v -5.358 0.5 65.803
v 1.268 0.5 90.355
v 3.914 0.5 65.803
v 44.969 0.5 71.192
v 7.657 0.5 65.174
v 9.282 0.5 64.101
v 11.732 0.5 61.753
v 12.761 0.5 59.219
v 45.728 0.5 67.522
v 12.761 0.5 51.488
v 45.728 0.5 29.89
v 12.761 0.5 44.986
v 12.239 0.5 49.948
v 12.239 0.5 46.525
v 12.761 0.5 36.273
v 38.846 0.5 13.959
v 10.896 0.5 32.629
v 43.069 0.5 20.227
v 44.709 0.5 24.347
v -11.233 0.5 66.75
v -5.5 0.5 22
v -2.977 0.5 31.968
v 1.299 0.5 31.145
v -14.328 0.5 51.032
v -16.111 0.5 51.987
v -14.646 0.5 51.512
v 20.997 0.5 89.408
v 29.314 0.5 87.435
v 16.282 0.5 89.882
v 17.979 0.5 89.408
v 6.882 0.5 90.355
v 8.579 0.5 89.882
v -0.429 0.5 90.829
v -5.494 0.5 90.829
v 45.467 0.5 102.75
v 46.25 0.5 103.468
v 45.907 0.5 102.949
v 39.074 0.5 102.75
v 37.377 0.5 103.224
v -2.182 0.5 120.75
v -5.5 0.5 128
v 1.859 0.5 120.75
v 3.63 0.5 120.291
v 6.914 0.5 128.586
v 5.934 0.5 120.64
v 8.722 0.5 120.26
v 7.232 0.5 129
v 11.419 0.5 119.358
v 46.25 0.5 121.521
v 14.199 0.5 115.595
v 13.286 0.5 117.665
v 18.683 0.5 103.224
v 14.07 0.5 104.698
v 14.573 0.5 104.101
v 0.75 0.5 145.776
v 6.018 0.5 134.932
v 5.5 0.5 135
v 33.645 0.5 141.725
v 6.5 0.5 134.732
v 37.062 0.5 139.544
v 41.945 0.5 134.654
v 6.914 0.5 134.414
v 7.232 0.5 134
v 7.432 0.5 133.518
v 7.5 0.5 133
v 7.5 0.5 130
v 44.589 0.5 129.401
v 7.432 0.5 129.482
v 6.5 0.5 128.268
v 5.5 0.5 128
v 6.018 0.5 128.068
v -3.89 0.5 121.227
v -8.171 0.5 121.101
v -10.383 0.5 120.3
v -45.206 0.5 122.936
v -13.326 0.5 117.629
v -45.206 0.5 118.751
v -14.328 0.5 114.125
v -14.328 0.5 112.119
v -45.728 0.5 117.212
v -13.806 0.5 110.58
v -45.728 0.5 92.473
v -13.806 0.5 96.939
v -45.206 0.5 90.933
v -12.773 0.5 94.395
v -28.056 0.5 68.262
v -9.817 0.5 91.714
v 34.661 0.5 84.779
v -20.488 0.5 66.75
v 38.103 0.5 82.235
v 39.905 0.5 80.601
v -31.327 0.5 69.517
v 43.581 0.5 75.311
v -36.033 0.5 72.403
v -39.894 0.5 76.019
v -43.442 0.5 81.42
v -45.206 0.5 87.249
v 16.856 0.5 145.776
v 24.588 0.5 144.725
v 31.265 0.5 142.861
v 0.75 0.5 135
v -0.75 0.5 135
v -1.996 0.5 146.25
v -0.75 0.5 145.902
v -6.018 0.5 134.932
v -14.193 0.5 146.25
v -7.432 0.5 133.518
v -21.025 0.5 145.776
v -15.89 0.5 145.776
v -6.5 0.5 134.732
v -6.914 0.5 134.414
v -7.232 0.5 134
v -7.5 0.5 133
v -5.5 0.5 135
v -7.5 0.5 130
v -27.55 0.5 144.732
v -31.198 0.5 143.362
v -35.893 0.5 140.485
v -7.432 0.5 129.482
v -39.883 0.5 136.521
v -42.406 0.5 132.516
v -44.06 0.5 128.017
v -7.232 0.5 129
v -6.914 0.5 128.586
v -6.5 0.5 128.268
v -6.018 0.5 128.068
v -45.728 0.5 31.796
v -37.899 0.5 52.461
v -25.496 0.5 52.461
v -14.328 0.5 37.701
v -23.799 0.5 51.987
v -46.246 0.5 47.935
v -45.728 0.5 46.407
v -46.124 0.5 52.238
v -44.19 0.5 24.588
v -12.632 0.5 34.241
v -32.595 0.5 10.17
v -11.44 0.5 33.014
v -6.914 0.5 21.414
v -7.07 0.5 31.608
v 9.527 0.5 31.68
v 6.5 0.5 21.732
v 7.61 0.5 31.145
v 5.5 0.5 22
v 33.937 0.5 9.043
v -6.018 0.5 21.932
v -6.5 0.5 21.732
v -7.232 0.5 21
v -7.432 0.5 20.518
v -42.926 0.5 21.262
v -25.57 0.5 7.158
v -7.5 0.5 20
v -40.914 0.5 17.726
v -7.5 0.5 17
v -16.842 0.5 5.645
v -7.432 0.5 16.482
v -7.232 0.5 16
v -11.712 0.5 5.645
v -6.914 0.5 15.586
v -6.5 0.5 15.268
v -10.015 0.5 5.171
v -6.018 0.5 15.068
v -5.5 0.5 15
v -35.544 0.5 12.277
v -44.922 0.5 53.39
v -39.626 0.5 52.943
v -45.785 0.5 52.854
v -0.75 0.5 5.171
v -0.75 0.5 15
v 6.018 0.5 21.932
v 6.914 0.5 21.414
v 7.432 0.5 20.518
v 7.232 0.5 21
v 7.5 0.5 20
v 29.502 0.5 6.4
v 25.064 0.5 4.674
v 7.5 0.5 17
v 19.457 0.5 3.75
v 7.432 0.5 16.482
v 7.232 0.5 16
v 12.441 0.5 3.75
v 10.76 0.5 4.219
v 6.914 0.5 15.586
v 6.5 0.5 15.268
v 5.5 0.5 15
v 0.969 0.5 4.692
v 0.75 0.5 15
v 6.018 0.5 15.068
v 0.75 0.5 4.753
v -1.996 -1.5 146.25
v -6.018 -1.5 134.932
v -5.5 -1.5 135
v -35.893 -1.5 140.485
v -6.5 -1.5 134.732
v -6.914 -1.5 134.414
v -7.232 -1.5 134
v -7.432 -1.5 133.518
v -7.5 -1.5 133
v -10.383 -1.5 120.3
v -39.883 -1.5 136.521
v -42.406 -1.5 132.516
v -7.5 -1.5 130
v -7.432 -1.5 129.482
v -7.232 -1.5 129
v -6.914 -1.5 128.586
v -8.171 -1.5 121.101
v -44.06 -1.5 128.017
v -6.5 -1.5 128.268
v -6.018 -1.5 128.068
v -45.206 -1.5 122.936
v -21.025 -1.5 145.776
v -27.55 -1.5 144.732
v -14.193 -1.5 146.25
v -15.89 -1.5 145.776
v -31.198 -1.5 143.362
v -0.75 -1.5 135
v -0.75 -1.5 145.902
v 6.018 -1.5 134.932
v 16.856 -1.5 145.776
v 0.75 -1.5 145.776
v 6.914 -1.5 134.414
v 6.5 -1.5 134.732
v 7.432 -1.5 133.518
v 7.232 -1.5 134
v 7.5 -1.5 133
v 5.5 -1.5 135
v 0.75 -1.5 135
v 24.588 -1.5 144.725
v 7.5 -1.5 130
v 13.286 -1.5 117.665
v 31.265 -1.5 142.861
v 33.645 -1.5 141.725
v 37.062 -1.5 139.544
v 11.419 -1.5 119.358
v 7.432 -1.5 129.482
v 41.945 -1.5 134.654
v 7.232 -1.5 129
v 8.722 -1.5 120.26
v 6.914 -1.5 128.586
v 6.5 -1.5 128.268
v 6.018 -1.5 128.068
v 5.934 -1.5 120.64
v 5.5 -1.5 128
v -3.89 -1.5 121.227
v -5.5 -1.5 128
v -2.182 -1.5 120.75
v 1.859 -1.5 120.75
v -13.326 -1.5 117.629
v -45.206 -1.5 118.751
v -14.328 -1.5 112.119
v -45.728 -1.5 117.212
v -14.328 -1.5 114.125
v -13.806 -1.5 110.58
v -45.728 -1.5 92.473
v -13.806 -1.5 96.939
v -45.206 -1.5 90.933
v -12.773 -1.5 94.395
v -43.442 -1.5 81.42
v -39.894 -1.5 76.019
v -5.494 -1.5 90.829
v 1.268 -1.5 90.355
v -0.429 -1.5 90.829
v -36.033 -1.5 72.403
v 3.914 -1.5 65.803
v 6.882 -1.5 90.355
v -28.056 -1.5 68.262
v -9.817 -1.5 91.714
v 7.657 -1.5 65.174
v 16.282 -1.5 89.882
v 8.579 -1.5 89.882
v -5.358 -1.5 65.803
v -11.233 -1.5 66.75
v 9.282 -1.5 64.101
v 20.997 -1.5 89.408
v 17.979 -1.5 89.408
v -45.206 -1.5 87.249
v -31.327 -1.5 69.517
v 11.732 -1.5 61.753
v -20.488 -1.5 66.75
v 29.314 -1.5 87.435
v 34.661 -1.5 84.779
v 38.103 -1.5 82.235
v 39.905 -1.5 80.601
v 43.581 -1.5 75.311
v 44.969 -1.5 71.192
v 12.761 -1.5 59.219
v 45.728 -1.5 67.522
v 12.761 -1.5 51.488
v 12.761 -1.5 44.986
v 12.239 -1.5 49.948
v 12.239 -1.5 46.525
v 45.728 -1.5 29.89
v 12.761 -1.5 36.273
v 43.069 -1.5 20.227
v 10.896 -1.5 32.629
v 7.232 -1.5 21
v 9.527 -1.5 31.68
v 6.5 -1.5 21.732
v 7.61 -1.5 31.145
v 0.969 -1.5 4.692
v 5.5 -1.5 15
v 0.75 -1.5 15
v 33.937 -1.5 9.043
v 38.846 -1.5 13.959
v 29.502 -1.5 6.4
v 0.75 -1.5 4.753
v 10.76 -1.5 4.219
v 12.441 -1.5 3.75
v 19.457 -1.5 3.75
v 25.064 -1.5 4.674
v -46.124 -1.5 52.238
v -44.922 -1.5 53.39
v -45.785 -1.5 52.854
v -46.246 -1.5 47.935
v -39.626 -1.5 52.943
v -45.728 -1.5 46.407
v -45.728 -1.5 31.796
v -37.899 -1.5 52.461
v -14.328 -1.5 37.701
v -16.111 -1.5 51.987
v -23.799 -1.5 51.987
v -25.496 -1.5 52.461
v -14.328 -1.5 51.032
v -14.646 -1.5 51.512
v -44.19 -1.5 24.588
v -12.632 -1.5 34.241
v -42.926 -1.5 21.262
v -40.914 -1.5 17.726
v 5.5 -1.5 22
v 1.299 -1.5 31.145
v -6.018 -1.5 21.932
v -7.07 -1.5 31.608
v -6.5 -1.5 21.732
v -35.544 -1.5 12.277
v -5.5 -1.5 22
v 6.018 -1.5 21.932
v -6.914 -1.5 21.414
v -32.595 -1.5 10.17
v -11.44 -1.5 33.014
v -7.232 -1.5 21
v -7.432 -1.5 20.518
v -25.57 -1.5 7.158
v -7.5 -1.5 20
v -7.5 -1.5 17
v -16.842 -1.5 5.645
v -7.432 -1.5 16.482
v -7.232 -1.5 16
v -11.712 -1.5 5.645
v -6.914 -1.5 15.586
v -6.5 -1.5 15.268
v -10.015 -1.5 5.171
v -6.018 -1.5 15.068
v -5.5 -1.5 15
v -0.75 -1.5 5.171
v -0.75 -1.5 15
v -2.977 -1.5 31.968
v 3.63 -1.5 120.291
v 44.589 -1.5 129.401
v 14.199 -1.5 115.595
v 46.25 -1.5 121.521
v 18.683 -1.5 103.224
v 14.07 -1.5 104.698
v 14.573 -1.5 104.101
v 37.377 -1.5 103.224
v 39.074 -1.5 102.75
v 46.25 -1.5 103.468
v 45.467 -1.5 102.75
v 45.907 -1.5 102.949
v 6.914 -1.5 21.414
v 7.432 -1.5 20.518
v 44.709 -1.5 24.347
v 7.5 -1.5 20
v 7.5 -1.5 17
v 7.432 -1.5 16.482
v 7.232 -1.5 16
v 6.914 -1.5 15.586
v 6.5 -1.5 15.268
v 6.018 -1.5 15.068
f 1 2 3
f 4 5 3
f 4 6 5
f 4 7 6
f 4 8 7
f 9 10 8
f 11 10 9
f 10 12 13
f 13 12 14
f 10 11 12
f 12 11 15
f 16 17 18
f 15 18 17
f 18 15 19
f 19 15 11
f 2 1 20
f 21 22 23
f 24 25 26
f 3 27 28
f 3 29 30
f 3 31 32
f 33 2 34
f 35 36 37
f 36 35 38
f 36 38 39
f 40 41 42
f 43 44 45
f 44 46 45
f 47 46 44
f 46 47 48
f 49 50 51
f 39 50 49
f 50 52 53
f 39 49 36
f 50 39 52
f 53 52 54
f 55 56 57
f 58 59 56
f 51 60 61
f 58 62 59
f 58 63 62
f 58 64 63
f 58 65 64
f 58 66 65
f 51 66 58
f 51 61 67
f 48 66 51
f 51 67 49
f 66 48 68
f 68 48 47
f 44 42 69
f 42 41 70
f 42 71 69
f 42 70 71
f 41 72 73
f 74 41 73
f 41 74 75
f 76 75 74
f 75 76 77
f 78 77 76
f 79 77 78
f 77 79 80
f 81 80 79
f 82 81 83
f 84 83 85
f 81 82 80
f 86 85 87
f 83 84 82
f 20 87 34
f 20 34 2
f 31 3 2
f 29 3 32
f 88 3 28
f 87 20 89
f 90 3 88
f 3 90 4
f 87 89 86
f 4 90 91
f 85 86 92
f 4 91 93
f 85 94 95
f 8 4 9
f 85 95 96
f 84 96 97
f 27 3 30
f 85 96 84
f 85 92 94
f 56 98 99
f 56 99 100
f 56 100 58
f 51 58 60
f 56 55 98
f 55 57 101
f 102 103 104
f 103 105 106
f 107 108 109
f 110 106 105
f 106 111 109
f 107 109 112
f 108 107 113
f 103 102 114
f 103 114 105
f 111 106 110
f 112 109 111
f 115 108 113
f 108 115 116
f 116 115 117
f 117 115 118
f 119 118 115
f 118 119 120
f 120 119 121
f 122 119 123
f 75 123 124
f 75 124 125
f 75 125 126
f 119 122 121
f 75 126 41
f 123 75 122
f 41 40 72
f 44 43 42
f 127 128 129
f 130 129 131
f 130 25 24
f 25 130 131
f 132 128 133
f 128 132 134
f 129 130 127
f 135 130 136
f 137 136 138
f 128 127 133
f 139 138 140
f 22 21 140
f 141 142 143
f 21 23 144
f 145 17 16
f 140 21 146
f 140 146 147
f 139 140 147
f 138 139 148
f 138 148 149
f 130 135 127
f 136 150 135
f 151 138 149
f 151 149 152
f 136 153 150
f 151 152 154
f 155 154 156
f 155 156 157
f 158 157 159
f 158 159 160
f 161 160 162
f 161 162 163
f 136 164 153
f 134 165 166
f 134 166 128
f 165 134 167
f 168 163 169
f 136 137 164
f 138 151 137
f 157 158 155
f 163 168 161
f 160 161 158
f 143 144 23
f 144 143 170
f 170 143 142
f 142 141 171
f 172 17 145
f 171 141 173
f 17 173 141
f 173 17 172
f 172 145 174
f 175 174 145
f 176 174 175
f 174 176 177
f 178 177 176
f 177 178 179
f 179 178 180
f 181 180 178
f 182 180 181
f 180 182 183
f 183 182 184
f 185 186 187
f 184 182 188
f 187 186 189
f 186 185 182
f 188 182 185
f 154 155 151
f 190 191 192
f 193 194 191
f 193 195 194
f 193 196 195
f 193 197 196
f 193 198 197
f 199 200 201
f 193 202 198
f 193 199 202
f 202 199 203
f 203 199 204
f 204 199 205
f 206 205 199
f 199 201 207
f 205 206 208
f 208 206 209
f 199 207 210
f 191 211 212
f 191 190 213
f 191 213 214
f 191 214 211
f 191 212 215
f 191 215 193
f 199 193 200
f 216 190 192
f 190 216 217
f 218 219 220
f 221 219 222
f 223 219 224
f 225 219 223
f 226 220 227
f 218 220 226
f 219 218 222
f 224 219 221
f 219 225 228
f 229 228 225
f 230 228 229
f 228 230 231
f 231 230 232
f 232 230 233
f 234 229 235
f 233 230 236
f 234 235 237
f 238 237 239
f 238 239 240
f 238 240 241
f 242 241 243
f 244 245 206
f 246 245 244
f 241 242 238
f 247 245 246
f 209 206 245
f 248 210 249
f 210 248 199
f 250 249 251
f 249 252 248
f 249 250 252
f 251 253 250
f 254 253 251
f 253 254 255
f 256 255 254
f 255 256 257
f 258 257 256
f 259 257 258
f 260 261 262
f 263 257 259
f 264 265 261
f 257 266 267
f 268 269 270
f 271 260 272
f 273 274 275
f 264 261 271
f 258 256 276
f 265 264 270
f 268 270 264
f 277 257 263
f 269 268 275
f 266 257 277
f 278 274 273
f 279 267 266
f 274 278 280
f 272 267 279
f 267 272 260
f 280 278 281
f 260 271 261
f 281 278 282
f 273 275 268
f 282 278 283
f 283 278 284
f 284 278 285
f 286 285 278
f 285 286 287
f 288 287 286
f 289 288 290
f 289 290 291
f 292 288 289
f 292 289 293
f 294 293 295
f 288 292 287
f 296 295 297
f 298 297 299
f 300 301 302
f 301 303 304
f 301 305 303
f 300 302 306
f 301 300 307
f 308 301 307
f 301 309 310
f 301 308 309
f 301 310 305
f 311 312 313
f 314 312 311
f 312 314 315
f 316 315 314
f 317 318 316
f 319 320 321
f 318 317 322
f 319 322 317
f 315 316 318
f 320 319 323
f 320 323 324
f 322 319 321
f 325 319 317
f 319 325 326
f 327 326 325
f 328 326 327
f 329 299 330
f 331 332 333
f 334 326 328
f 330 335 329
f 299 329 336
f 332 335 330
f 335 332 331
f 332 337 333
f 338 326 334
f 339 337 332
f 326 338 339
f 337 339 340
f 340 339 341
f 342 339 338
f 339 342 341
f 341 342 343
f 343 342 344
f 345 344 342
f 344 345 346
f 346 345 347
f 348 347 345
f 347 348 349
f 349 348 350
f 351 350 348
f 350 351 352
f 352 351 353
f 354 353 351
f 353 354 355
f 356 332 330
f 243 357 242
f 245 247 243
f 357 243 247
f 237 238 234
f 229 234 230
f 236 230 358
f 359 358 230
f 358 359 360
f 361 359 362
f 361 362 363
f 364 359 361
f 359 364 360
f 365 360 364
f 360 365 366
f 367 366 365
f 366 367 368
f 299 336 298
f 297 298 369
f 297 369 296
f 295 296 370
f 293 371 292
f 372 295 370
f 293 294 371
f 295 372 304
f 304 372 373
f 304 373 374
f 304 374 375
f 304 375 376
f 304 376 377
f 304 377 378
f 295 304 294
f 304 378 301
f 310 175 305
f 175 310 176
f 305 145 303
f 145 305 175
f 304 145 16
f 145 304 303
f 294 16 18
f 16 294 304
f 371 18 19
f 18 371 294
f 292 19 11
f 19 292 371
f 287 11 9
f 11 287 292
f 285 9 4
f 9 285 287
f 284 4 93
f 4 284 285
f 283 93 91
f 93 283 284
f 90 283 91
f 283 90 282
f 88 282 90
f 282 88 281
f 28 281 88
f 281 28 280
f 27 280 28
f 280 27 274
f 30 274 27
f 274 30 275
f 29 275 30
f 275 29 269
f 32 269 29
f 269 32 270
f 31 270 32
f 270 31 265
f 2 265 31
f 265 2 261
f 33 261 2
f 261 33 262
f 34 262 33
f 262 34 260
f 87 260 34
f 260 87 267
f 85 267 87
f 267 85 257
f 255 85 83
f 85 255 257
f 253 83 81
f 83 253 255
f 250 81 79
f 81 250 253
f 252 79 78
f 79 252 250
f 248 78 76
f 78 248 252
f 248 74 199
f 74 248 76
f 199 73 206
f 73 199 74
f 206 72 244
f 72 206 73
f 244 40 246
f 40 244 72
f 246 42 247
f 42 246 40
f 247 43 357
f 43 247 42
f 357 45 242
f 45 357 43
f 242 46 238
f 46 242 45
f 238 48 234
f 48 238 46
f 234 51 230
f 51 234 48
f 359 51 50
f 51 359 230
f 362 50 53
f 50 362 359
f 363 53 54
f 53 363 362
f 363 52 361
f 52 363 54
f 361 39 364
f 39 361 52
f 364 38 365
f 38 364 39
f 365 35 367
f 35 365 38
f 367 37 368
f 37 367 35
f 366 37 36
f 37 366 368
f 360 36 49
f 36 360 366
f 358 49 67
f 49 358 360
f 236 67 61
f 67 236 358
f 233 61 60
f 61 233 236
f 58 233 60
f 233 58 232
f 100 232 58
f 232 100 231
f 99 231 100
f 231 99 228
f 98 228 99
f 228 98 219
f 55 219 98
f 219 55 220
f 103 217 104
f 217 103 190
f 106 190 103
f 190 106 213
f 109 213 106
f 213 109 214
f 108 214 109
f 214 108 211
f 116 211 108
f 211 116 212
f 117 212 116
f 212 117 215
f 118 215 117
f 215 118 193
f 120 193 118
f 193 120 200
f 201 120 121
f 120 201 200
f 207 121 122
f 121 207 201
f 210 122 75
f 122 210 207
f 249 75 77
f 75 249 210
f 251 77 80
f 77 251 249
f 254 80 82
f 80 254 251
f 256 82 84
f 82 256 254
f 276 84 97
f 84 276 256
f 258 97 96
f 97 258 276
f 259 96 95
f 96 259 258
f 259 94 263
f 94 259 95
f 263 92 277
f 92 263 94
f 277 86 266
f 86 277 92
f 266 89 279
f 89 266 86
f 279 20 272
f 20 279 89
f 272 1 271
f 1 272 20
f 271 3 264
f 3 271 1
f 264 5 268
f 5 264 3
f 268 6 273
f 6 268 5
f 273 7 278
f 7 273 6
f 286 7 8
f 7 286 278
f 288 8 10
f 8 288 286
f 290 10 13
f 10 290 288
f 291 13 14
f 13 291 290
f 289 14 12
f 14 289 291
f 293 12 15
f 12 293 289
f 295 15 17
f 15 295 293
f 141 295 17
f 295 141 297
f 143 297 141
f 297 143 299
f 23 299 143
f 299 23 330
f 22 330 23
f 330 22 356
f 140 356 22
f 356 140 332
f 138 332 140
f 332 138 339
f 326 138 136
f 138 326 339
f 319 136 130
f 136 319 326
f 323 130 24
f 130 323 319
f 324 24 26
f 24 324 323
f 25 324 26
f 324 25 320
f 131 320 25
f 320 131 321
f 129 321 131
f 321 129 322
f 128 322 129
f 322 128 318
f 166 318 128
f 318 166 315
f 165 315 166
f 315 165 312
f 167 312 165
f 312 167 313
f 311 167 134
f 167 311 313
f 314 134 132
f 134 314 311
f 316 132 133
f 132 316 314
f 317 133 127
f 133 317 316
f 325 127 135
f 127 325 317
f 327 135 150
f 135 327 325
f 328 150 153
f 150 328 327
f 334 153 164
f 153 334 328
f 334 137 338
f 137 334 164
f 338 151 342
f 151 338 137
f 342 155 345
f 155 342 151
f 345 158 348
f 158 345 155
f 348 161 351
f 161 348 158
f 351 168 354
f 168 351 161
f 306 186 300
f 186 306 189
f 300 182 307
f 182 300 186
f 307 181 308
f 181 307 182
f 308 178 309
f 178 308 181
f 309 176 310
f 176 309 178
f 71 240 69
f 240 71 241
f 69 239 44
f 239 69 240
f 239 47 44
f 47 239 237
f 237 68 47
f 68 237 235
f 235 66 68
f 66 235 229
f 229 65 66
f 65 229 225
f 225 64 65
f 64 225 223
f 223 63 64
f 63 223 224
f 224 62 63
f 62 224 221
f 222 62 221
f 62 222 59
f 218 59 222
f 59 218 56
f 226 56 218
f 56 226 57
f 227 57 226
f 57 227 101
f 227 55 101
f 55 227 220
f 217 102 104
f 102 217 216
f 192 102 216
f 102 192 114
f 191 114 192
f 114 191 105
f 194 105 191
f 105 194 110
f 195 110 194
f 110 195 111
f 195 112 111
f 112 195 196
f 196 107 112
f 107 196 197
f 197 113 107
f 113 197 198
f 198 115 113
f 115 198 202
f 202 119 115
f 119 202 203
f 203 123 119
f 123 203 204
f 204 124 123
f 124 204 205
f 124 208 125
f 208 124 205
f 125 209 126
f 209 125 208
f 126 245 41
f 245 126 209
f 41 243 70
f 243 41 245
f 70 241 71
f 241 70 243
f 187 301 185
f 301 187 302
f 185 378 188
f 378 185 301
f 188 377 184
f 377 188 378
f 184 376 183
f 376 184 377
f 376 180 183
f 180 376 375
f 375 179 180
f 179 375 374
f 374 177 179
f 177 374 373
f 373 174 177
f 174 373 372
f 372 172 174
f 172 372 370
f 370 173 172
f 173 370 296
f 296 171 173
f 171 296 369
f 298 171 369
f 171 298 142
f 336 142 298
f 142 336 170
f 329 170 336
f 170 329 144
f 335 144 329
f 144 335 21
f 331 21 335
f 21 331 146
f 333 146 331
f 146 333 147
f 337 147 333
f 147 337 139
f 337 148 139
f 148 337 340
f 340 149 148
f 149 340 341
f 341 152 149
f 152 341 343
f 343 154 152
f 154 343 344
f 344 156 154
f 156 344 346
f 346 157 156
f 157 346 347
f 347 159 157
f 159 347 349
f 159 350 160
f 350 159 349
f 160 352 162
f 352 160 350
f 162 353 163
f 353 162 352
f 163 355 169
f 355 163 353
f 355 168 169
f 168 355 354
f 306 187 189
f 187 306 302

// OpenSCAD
// file: shape_pts.scad
// Letter "S" (#7 Upper) ? Top X=0 Conduit + Bottom X=0 Conduit to Snake I
// Vertical-display edition: bottom divider clip removed, interlocking hollow double-dovetail channels added.

shape_w = 94.00;
shape_h = 144.00;

rec_snap_top_x = -0.81;
rec_snap_top_z = 144.00;
rec_snap_bot_x = 3.51;

rec_top_conn_enable   = true;
rec_top_conn_x        = 0.00;
rec_bot_conn_enable   = true;
rec_bot_conn_x        = 0.00;
rec_left_conn_enable  = false;
rec_left_conn_z       = 0.00;
rec_left_conn_face_x  = 0.00;
rec_left_conn_pocket_x = 0.00;
rec_right_conn_enable = false;
rec_right_conn_z      = 0.00;
rec_right_conn_face_x = 0.00;
rec_right_conn_pocket_x = 0.00;

rec_magnet_enable = true;
rec_magnet_x      = 28.80;
rec_magnet_z      = 120.20;

rec_wall_mount_enable = false;
rec_wall_mount_x      = 0.00;
rec_wall_mount_z      = 75.00;

rec_include_controller = false;
rec_chip_x     = 28.50;
rec_chip_z     = 55.00;
rec_cable_x    = 28.50;
rec_ziptie_z   = 30.50;
rec_keyhole_z  = 18.00;
rec_slit_dir   = 1;

rec_pillars = [[-28.0, 118.0], [-28.0, 86.0], [28.5, 48.0]];
rec_has_face_grooves = false;

shape_pts = [[47.000,118.599],[47.000,100.243],[46.413,99.355],[45.629,99.000],[38.971,99.000],[37.274,99.474],[18.604,99.474],[14.165,100.421],[13.317,101.428],[13.447,112.441],[12.664,114.217],[11.032,115.697],[8.551,116.526],[5.940,116.882],[3.590,116.526],[1.763,117.000],[-2.285,117.000],[-3.982,117.474],[-8.029,117.355],[-9.988,116.645],[-12.664,114.217],[-13.578,111.020],[-13.578,109.243],[-13.056,107.704],[-13.056,94.086],[-12.142,91.836],[-9.465,89.408],[-5.418,88.579],[-0.326,88.579],[1.371,88.105],[6.985,88.105],[8.682,87.632],[16.385,87.632],[18.082,87.158],[21.085,87.158],[29.571,85.145],[35.054,82.421],[38.579,79.816],[40.472,78.099],[44.258,72.651],[45.694,68.388],[46.478,64.599],[46.478,26.822],[45.433,21.138],[43.736,16.875],[39.428,10.480],[34.401,5.447],[29.832,2.724],[25.263,0.947],[19.518,0.000],[12.338,0.000],[10.640,0.474],[0.849,0.947],[-0.849,1.421],[-10.118,1.421],[-11.815,1.895],[-16.907,1.895],[-25.785,3.434],[-32.965,6.513],[-36.033,8.704],[-41.517,14.270],[-43.606,17.941],[-44.911,21.375],[-46.478,28.717],[-46.478,43.283],[-47.000,44.822],[-46.869,49.441],[-46.347,50.388],[-45.107,51.158],[-39.493,50.684],[-37.796,50.211],[-25.393,50.211],[-23.696,49.737],[-15.993,49.737],[-14.165,49.145],[-13.578,48.257],[-13.578,34.875],[-12.011,31.678],[-11.032,30.671],[-6.985,29.368],[-2.938,29.724],[1.371,28.895],[7.507,28.895],[9.204,29.368],[10.314,30.138],[12.011,33.454],[12.011,41.862],[11.489,43.401],[11.489,47.072],[12.011,48.612],[12.011,56.072],[11.097,58.322],[8.812,60.513],[7.376,61.461],[3.851,62.053],[-5.418,62.053],[-11.293,63.000],[-20.562,63.000],[-28.265,64.539],[-31.660,65.842],[-36.490,68.803],[-40.472,72.533],[-44.128,78.099],[-45.956,84.138],[-45.956,87.809],[-46.478,89.349],[-46.478,114.336],[-45.956,115.875],[-45.956,120.020],[-44.781,125.230],[-43.083,129.849],[-40.472,133.993],[-36.360,138.079],[-31.529,141.039],[-27.743,142.461],[-21.085,143.526],[-15.993,143.526],[-14.296,144.000],[-1.893,144.000],[-0.196,143.526],[16.907,143.526],[24.740,142.461],[31.529,140.566],[34.010,139.382],[37.535,137.132],[42.561,132.099],[45.303,126.651]];
shape_paths = [[0, 1, 2, 3, 4, 5, 6, 7, 8, 9, 10, 11, 12, 13, 14, 15, 16, 17, 18, 19, 20, 21, 22, 23, 24, 25, 26, 27, 28, 29, 30, 31, 32, 33, 34, 35, 36, 37, 38, 39, 40, 41, 42, 43, 44, 45, 46, 47, 48, 49, 50, 51, 52, 53, 54, 55, 56, 57, 58, 59, 60, 61, 62, 63, 64, 65, 66, 67, 68, 69, 70, 71, 72, 73, 74, 75, 76, 77, 78, 79, 80, 81, 82, 83, 84, 85, 86, 87, 88, 89, 90, 91, 92, 93, 94, 95, 96, 97, 98, 99, 100, 101, 102, 103, 104, 105, 106, 107, 108, 109, 110, 111, 112, 113, 114, 115, 116, 117, 118, 119, 120, 121, 122, 123, 124, 125, 126]];

diffuser_shape_pts = [[47.000,118.599],[47.000,100.243],[46.413,99.355],[45.629,99.000],[38.971,99.000],[37.274,99.474],[18.604,99.474],[14.165,100.421],[13.317,101.428],[13.447,112.441],[12.664,114.217],[11.032,115.697],[8.551,116.526],[5.940,116.882],[3.590,116.526],[1.763,117.000],[-2.285,117.000],[-3.982,117.474],[-8.029,117.355],[-9.988,116.645],[-12.664,114.217],[-13.578,111.020],[-13.578,109.243],[-13.056,107.704],[-13.056,94.086],[-12.142,91.836],[-9.465,89.408],[-5.418,88.579],[-0.326,88.579],[1.371,88.105],[6.985,88.105],[8.682,87.632],[16.385,87.632],[18.082,87.158],[21.085,87.158],[29.571,85.145],[35.054,82.421],[38.579,79.816],[40.472,78.099],[44.258,72.651],[45.694,68.388],[46.478,64.599],[46.478,26.822],[45.433,21.138],[43.736,16.875],[39.428,10.480],[34.401,5.447],[29.832,2.724],[25.263,0.947],[19.518,0.000],[12.338,0.000],[10.640,0.474],[0.849,0.947],[-0.849,1.421],[-10.118,1.421],[-11.815,1.895],[-16.907,1.895],[-25.785,3.434],[-32.965,6.513],[-36.033,8.704],[-41.517,14.270],[-43.606,17.941],[-44.911,21.375],[-46.478,28.717],[-46.478,43.283],[-47.000,44.822],[-46.869,49.441],[-46.347,50.388],[-45.107,51.158],[-39.493,50.684],[-37.796,50.211],[-25.393,50.211],[-23.696,49.737],[-15.993,49.737],[-14.165,49.145],[-13.578,48.257],[-13.578,34.875],[-12.011,31.678],[-11.032,30.671],[-6.985,29.368],[-2.938,29.724],[1.371,28.895],[7.507,28.895],[9.204,29.368],[10.314,30.138],[12.011,33.454],[12.011,41.862],[11.489,43.401],[11.489,47.072],[12.011,48.612],[12.011,56.072],[11.097,58.322],[8.812,60.513],[7.376,61.461],[3.851,62.053],[-5.418,62.053],[-11.293,63.000],[-20.562,63.000],[-28.265,64.539],[-31.660,65.842],[-36.490,68.803],[-40.472,72.533],[-44.128,78.099],[-45.956,84.138],[-45.956,87.809],[-46.478,89.349],[-46.478,114.336],[-45.956,115.875],[-45.956,120.020],[-44.781,125.230],[-43.083,129.849],[-40.472,133.993],[-36.360,138.079],[-31.529,141.039],[-27.743,142.461],[-21.085,143.526],[-15.993,143.526],[-14.296,144.000],[-1.893,144.000],[-0.196,143.526],[16.907,143.526],[24.740,142.461],[31.529,140.566],[34.010,139.382],[37.535,137.132],[42.561,132.099],[45.303,126.651]];
diffuser_shape_paths = [[0, 1, 2, 3, 4, 5, 6, 7, 8, 9, 10, 11, 12, 13, 14, 15, 16, 17, 18, 19, 20, 21, 22, 23, 24, 25, 26, 27, 28, 29, 30, 31, 32, 33, 34, 35, 36, 37, 38, 39, 40, 41, 42, 43, 44, 45, 46, 47, 48, 49, 50, 51, 52, 53, 54, 55, 56, 57, 58, 59, 60, 61, 62, 63, 64, 65, 66, 67, 68, 69, 70, 71, 72, 73, 74, 75, 76, 77, 78, 79, 80, 81, 82, 83, 84, 85, 86, 87, 88, 89, 90, 91, 92, 93, 94, 95, 96, 97, 98, 99, 100, 101, 102, 103, 104, 105, 106, 107, 108, 109, 110, 111, 112, 113, 114, 115, 116, 117, 118, 119, 120, 121, 122, 123, 124, 125, 126]];

module shape_2d(pts = shape_pts) {
    polygon(points = pts, paths = shape_paths);
}

module diffuser_shape_2d(pts = diffuser_shape_pts) {
    polygon(points = pts, paths = diffuser_shape_paths);
}

module diffuser_face_grooves_2d() {}
// main file
// Letter "S" (#7 Upper) ? Top X=0 Conduit + Bottom X=0 Conduit to Snake I ? internal white reflector plate (2.00 mm thick, aligned LED-strip conduit pockets + entry slits)
// Opens and exports standalone in OpenSCAD / OpenSCAD.js.

use <lamp_core.scad>

render_lamp_part("reflector");
